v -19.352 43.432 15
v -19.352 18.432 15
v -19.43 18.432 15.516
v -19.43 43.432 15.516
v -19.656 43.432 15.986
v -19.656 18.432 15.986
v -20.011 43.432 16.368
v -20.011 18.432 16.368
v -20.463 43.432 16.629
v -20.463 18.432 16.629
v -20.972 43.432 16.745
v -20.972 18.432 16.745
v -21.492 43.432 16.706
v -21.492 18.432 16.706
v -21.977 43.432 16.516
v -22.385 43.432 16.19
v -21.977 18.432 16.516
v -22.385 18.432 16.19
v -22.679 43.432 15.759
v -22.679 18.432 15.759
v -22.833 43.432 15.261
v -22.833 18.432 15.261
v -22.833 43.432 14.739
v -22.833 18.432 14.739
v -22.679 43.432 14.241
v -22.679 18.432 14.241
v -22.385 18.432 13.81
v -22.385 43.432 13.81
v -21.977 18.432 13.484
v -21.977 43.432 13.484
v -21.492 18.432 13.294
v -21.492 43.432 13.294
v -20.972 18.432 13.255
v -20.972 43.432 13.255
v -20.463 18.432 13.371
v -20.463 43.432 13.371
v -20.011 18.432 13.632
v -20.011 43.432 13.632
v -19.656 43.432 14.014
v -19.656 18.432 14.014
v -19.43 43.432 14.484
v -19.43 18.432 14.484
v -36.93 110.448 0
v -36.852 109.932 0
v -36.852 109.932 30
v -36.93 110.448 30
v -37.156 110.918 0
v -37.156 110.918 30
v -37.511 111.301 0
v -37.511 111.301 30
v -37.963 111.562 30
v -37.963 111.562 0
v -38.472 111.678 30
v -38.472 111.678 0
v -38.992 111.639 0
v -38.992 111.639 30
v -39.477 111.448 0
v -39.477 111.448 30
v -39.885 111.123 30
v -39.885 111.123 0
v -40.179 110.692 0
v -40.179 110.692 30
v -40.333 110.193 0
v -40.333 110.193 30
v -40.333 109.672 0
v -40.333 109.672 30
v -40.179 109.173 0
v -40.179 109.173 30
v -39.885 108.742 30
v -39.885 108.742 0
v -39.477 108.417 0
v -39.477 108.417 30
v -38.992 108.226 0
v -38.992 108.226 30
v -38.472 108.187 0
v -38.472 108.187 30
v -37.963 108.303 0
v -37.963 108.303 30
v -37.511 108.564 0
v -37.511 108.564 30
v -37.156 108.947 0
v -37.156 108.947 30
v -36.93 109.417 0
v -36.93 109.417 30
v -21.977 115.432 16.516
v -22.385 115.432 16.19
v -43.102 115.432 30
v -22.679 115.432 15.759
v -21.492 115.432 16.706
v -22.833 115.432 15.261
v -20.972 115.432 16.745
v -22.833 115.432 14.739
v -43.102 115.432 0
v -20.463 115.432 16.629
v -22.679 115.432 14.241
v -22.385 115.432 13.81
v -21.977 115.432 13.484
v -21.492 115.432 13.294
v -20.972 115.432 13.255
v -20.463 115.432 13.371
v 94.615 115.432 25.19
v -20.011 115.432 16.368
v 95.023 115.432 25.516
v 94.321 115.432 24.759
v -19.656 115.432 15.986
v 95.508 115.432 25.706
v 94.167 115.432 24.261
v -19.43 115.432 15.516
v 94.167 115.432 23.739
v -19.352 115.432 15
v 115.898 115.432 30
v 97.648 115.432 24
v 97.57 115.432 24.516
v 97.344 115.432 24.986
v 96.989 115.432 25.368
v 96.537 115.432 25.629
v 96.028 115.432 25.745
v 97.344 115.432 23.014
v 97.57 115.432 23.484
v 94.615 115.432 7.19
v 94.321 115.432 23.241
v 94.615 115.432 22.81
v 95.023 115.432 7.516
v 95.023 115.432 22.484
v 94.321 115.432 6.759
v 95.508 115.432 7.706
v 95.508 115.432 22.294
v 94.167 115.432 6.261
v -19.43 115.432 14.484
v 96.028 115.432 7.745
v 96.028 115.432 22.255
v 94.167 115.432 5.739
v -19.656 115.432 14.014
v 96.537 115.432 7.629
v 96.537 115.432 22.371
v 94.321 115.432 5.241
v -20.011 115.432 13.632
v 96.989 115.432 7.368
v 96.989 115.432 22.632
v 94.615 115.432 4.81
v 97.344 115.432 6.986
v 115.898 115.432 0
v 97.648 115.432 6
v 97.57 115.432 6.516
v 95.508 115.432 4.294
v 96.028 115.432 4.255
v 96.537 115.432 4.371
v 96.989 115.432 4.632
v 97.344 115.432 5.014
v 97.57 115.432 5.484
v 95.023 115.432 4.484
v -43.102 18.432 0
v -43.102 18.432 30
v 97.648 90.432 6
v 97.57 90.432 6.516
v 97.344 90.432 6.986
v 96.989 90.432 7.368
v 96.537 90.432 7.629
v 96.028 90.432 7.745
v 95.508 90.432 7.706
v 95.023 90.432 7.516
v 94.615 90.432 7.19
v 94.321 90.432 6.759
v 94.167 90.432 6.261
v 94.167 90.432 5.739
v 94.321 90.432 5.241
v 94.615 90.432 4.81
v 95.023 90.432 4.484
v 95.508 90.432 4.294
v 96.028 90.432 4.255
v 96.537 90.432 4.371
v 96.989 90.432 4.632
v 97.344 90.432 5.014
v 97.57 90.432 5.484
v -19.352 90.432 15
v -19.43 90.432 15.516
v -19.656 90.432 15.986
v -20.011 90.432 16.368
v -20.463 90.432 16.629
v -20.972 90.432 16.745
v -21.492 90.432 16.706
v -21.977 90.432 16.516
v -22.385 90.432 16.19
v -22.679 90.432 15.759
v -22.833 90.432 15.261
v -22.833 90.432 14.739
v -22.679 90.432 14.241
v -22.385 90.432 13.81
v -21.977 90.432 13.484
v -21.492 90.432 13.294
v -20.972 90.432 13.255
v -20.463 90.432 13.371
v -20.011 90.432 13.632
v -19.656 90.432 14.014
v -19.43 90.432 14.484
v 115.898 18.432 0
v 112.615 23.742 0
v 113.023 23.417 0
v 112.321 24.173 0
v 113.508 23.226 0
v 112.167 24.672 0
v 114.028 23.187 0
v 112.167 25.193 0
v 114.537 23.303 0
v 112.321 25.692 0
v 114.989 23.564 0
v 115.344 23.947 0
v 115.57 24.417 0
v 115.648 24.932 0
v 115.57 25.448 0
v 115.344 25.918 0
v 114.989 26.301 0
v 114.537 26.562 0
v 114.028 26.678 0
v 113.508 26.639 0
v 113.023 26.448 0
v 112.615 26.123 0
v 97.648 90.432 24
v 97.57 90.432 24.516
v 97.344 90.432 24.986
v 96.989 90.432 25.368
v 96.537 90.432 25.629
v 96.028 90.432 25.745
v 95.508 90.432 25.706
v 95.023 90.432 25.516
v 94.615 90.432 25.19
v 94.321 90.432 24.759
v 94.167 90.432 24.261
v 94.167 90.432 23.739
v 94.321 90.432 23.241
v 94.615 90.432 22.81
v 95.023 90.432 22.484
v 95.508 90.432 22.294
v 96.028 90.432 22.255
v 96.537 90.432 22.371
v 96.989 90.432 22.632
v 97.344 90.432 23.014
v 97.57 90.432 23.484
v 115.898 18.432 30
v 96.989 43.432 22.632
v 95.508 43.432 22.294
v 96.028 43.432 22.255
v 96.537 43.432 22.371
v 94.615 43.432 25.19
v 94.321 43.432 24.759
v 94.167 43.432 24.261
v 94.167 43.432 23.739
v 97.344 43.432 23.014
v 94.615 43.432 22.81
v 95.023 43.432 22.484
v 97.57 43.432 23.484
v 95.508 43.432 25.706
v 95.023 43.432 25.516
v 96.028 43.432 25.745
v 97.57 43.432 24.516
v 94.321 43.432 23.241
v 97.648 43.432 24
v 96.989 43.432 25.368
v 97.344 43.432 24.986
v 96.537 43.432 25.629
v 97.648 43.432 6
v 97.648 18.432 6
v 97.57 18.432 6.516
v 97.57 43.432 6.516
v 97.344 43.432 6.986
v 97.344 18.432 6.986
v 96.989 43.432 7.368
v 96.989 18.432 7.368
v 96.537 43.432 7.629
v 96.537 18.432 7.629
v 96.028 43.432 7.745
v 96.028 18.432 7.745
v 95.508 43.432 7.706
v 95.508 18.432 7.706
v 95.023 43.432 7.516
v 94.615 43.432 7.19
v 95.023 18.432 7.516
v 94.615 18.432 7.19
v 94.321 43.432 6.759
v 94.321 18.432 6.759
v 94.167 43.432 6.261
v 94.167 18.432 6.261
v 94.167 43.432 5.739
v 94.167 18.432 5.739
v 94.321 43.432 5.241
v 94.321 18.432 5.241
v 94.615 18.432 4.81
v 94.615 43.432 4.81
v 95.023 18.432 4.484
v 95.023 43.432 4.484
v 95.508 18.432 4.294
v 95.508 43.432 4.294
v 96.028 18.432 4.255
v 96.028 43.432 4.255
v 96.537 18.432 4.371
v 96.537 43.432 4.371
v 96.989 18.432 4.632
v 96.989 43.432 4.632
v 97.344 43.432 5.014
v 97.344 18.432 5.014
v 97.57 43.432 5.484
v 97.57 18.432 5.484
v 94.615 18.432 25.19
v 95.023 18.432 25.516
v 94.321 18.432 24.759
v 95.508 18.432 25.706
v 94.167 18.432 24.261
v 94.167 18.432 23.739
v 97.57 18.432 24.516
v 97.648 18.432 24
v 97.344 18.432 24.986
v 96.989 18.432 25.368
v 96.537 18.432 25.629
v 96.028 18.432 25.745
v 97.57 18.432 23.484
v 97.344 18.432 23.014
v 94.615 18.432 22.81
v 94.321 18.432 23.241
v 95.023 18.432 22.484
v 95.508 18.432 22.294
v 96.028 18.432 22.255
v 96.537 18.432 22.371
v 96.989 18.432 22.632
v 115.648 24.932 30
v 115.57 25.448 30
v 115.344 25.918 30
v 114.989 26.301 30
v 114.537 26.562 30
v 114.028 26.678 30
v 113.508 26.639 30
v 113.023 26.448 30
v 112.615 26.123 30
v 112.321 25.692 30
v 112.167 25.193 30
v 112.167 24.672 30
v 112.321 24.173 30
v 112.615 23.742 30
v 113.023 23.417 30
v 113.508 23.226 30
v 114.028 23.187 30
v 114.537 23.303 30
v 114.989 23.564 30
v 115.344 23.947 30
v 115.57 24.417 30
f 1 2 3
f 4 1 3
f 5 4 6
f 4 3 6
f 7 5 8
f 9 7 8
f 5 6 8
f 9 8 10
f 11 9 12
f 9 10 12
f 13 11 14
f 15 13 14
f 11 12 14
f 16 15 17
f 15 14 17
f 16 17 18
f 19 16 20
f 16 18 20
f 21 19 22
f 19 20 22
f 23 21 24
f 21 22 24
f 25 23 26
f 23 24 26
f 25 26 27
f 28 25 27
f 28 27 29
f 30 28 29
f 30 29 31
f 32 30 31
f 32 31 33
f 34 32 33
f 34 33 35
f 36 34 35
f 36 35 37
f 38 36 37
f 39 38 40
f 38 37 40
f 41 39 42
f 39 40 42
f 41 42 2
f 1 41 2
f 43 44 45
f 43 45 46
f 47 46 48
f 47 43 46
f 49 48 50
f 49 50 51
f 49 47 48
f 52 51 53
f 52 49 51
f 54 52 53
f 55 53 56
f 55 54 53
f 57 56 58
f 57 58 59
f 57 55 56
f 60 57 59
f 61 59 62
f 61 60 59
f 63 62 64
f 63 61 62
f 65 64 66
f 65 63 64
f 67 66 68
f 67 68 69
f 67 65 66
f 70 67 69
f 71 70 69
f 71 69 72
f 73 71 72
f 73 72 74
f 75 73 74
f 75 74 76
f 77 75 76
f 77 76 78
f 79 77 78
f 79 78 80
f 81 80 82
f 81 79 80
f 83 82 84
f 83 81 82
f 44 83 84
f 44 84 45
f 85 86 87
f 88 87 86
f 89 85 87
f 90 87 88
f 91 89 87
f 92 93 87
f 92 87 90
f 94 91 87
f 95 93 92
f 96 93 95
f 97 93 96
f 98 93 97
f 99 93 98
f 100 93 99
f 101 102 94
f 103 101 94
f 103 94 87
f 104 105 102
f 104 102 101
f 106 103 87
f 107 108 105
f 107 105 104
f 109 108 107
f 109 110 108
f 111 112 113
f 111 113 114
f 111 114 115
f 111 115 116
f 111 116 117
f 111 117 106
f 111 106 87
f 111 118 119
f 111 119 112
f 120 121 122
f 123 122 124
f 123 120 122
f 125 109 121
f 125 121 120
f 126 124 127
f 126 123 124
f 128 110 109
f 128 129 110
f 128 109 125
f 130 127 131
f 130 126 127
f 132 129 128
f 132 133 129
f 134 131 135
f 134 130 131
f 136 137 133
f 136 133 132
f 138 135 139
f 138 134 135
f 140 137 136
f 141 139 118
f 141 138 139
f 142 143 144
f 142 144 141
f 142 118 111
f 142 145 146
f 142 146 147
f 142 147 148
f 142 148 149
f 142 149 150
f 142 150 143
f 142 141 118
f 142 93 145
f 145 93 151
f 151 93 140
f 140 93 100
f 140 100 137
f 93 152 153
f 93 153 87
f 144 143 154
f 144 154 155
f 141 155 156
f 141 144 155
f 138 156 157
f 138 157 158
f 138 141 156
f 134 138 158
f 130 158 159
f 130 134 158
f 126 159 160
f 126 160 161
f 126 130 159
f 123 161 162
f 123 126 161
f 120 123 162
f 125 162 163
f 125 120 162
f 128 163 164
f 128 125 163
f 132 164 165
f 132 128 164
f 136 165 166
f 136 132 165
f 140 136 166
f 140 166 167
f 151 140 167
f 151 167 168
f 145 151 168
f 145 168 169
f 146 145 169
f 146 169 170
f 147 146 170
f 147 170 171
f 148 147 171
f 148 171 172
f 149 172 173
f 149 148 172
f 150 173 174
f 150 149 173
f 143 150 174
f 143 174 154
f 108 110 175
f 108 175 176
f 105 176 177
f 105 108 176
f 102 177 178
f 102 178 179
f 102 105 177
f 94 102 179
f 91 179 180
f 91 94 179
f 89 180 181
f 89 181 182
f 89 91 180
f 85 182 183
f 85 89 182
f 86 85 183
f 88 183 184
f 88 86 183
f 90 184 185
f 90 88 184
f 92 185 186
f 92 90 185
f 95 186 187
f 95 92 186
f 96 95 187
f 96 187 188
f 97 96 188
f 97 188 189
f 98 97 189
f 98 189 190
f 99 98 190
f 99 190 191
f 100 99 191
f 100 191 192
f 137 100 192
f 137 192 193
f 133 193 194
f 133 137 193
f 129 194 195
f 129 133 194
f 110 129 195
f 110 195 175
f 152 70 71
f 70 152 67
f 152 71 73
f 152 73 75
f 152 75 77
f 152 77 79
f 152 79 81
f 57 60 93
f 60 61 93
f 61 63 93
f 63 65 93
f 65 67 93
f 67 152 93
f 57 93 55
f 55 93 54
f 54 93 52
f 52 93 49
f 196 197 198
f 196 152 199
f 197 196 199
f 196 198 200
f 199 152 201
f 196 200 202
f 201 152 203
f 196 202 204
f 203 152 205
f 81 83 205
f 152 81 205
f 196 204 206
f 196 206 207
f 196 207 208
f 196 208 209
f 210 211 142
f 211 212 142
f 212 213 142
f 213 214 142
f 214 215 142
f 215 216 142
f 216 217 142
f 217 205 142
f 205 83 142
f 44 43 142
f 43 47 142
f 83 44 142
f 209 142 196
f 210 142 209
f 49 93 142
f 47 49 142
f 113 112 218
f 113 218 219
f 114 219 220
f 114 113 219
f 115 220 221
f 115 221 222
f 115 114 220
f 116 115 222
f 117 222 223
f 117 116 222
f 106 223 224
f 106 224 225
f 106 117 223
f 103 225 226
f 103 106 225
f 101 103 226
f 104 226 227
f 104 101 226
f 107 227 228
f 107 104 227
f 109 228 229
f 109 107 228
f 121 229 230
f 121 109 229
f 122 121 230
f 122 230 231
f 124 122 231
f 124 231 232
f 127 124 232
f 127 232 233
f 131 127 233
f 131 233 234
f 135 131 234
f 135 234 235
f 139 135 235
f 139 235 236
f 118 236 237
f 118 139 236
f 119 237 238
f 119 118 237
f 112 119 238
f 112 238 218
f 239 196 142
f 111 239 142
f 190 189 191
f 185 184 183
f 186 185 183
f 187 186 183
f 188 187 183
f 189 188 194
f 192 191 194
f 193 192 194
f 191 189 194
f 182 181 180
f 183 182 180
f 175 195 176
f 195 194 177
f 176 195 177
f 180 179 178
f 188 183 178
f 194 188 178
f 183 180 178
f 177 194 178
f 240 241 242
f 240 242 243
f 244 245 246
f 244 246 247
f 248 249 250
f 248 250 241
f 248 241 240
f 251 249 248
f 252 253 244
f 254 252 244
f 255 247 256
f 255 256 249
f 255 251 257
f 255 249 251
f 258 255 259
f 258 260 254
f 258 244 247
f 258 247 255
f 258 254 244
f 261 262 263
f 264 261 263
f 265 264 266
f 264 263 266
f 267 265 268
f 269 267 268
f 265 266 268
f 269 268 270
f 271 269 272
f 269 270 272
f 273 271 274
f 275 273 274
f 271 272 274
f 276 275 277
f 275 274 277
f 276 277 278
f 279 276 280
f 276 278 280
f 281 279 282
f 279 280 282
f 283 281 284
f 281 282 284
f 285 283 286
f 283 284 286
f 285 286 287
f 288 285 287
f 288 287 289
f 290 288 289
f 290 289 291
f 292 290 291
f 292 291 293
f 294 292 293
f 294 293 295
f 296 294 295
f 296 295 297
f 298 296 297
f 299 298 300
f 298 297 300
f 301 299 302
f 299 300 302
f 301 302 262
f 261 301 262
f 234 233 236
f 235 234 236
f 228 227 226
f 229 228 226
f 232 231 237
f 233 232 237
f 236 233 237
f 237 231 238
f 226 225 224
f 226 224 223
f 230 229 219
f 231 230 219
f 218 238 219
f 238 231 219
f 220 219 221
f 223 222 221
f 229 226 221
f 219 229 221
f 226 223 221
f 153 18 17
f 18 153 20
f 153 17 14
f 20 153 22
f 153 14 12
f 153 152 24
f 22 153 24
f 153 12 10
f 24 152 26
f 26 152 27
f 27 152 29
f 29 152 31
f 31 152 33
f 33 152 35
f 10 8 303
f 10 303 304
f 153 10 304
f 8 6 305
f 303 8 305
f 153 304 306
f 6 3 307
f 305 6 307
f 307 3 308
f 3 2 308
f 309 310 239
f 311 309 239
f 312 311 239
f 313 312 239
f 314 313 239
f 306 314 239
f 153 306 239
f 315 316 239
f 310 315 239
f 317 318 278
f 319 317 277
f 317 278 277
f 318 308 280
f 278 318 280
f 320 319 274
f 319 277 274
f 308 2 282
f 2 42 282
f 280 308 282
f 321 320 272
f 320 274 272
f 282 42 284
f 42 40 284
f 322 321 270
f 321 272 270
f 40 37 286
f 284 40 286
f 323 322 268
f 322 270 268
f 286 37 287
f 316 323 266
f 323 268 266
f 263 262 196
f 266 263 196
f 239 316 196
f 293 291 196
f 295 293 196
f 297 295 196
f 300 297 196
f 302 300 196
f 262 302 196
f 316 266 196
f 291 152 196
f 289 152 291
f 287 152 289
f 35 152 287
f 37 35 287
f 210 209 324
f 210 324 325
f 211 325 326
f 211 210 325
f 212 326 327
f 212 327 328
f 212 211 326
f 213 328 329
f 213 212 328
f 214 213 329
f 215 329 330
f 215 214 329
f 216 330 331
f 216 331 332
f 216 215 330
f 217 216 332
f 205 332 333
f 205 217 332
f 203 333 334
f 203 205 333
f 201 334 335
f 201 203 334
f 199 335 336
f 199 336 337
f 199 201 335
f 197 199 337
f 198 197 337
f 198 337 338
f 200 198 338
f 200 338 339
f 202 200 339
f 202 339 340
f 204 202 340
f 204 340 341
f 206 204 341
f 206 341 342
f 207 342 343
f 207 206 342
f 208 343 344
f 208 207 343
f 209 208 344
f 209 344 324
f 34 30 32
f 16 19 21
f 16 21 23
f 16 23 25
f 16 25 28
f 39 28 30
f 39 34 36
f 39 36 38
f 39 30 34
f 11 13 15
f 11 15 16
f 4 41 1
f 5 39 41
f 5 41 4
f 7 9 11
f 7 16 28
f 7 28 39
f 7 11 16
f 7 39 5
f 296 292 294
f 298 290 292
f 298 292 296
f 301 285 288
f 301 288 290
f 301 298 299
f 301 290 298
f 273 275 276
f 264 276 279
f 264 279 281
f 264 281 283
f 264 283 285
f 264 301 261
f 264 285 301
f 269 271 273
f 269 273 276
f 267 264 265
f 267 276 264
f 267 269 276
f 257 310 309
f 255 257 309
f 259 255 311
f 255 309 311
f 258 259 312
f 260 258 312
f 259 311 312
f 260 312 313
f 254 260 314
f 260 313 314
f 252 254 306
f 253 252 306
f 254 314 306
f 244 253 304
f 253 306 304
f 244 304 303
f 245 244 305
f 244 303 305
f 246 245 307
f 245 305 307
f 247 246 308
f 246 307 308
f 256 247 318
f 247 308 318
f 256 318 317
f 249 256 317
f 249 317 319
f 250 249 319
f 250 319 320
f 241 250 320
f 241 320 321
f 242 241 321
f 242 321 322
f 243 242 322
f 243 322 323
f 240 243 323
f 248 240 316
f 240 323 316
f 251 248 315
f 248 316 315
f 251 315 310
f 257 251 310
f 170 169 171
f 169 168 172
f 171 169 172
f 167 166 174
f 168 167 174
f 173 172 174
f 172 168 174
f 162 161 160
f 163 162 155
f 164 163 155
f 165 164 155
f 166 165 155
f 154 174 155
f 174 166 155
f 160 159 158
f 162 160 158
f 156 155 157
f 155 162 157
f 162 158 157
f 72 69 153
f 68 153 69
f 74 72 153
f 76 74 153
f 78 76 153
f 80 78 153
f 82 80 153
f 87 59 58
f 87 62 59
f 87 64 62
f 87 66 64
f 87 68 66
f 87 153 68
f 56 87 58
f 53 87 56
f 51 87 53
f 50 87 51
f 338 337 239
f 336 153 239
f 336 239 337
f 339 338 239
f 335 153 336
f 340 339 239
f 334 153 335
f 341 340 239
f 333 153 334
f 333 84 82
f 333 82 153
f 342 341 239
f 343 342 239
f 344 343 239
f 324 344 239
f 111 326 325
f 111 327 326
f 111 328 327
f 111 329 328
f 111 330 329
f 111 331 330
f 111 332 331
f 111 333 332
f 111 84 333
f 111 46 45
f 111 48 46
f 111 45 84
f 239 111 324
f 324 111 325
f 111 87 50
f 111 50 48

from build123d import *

# Parameters (mm, degrees)
F0_W     = 159
F0_H     = 97
F0_R     = 1.75
F1_DEPTH = 30
F2_R     = 1.75
F3_DEPTH = 25


# Not quite as in the source:
# - a pattern or mirror of a feature is missing from the dataset's text; its kind, count and spacing are read off the source's solid


with BuildPart() as f1:
    # F0 (on Top) → F1 (new body)
    with BuildSketch(Plane.XY):
        with Locations((36.3976350129, 66.932474792)):
            Rectangle(F0_W, F0_H)
        with Locations((113.8976350129, 24.932474792)):
            Circle(F0_R, mode=Mode.SUBTRACT)
        with Locations((-38.6023649871, 109.932474792)):
            Circle(F0_R, mode=Mode.SUBTRACT)
    extrude(amount=F1_DEPTH)

    # F2 (on face) → F3 (cut)
    with BuildSketch(Plane.XZ.offset(-18.432474792)):
        with Locations((-21.1023649871, 15)):
            Circle(F2_R)
        with Locations((95.8976350129, 24)):
            Circle(F2_R)
        with Locations((95.8976350129, 6)):
            Circle(F2_R)
    f3 = extrude(amount=-F3_DEPTH, mode=Mode.SUBTRACT)

    # F3_copies: F3 across plane
    add(f3.mirror(Plane.ZX.offset(66.932475)), mode=Mode.SUBTRACT)


solid = f1.part
